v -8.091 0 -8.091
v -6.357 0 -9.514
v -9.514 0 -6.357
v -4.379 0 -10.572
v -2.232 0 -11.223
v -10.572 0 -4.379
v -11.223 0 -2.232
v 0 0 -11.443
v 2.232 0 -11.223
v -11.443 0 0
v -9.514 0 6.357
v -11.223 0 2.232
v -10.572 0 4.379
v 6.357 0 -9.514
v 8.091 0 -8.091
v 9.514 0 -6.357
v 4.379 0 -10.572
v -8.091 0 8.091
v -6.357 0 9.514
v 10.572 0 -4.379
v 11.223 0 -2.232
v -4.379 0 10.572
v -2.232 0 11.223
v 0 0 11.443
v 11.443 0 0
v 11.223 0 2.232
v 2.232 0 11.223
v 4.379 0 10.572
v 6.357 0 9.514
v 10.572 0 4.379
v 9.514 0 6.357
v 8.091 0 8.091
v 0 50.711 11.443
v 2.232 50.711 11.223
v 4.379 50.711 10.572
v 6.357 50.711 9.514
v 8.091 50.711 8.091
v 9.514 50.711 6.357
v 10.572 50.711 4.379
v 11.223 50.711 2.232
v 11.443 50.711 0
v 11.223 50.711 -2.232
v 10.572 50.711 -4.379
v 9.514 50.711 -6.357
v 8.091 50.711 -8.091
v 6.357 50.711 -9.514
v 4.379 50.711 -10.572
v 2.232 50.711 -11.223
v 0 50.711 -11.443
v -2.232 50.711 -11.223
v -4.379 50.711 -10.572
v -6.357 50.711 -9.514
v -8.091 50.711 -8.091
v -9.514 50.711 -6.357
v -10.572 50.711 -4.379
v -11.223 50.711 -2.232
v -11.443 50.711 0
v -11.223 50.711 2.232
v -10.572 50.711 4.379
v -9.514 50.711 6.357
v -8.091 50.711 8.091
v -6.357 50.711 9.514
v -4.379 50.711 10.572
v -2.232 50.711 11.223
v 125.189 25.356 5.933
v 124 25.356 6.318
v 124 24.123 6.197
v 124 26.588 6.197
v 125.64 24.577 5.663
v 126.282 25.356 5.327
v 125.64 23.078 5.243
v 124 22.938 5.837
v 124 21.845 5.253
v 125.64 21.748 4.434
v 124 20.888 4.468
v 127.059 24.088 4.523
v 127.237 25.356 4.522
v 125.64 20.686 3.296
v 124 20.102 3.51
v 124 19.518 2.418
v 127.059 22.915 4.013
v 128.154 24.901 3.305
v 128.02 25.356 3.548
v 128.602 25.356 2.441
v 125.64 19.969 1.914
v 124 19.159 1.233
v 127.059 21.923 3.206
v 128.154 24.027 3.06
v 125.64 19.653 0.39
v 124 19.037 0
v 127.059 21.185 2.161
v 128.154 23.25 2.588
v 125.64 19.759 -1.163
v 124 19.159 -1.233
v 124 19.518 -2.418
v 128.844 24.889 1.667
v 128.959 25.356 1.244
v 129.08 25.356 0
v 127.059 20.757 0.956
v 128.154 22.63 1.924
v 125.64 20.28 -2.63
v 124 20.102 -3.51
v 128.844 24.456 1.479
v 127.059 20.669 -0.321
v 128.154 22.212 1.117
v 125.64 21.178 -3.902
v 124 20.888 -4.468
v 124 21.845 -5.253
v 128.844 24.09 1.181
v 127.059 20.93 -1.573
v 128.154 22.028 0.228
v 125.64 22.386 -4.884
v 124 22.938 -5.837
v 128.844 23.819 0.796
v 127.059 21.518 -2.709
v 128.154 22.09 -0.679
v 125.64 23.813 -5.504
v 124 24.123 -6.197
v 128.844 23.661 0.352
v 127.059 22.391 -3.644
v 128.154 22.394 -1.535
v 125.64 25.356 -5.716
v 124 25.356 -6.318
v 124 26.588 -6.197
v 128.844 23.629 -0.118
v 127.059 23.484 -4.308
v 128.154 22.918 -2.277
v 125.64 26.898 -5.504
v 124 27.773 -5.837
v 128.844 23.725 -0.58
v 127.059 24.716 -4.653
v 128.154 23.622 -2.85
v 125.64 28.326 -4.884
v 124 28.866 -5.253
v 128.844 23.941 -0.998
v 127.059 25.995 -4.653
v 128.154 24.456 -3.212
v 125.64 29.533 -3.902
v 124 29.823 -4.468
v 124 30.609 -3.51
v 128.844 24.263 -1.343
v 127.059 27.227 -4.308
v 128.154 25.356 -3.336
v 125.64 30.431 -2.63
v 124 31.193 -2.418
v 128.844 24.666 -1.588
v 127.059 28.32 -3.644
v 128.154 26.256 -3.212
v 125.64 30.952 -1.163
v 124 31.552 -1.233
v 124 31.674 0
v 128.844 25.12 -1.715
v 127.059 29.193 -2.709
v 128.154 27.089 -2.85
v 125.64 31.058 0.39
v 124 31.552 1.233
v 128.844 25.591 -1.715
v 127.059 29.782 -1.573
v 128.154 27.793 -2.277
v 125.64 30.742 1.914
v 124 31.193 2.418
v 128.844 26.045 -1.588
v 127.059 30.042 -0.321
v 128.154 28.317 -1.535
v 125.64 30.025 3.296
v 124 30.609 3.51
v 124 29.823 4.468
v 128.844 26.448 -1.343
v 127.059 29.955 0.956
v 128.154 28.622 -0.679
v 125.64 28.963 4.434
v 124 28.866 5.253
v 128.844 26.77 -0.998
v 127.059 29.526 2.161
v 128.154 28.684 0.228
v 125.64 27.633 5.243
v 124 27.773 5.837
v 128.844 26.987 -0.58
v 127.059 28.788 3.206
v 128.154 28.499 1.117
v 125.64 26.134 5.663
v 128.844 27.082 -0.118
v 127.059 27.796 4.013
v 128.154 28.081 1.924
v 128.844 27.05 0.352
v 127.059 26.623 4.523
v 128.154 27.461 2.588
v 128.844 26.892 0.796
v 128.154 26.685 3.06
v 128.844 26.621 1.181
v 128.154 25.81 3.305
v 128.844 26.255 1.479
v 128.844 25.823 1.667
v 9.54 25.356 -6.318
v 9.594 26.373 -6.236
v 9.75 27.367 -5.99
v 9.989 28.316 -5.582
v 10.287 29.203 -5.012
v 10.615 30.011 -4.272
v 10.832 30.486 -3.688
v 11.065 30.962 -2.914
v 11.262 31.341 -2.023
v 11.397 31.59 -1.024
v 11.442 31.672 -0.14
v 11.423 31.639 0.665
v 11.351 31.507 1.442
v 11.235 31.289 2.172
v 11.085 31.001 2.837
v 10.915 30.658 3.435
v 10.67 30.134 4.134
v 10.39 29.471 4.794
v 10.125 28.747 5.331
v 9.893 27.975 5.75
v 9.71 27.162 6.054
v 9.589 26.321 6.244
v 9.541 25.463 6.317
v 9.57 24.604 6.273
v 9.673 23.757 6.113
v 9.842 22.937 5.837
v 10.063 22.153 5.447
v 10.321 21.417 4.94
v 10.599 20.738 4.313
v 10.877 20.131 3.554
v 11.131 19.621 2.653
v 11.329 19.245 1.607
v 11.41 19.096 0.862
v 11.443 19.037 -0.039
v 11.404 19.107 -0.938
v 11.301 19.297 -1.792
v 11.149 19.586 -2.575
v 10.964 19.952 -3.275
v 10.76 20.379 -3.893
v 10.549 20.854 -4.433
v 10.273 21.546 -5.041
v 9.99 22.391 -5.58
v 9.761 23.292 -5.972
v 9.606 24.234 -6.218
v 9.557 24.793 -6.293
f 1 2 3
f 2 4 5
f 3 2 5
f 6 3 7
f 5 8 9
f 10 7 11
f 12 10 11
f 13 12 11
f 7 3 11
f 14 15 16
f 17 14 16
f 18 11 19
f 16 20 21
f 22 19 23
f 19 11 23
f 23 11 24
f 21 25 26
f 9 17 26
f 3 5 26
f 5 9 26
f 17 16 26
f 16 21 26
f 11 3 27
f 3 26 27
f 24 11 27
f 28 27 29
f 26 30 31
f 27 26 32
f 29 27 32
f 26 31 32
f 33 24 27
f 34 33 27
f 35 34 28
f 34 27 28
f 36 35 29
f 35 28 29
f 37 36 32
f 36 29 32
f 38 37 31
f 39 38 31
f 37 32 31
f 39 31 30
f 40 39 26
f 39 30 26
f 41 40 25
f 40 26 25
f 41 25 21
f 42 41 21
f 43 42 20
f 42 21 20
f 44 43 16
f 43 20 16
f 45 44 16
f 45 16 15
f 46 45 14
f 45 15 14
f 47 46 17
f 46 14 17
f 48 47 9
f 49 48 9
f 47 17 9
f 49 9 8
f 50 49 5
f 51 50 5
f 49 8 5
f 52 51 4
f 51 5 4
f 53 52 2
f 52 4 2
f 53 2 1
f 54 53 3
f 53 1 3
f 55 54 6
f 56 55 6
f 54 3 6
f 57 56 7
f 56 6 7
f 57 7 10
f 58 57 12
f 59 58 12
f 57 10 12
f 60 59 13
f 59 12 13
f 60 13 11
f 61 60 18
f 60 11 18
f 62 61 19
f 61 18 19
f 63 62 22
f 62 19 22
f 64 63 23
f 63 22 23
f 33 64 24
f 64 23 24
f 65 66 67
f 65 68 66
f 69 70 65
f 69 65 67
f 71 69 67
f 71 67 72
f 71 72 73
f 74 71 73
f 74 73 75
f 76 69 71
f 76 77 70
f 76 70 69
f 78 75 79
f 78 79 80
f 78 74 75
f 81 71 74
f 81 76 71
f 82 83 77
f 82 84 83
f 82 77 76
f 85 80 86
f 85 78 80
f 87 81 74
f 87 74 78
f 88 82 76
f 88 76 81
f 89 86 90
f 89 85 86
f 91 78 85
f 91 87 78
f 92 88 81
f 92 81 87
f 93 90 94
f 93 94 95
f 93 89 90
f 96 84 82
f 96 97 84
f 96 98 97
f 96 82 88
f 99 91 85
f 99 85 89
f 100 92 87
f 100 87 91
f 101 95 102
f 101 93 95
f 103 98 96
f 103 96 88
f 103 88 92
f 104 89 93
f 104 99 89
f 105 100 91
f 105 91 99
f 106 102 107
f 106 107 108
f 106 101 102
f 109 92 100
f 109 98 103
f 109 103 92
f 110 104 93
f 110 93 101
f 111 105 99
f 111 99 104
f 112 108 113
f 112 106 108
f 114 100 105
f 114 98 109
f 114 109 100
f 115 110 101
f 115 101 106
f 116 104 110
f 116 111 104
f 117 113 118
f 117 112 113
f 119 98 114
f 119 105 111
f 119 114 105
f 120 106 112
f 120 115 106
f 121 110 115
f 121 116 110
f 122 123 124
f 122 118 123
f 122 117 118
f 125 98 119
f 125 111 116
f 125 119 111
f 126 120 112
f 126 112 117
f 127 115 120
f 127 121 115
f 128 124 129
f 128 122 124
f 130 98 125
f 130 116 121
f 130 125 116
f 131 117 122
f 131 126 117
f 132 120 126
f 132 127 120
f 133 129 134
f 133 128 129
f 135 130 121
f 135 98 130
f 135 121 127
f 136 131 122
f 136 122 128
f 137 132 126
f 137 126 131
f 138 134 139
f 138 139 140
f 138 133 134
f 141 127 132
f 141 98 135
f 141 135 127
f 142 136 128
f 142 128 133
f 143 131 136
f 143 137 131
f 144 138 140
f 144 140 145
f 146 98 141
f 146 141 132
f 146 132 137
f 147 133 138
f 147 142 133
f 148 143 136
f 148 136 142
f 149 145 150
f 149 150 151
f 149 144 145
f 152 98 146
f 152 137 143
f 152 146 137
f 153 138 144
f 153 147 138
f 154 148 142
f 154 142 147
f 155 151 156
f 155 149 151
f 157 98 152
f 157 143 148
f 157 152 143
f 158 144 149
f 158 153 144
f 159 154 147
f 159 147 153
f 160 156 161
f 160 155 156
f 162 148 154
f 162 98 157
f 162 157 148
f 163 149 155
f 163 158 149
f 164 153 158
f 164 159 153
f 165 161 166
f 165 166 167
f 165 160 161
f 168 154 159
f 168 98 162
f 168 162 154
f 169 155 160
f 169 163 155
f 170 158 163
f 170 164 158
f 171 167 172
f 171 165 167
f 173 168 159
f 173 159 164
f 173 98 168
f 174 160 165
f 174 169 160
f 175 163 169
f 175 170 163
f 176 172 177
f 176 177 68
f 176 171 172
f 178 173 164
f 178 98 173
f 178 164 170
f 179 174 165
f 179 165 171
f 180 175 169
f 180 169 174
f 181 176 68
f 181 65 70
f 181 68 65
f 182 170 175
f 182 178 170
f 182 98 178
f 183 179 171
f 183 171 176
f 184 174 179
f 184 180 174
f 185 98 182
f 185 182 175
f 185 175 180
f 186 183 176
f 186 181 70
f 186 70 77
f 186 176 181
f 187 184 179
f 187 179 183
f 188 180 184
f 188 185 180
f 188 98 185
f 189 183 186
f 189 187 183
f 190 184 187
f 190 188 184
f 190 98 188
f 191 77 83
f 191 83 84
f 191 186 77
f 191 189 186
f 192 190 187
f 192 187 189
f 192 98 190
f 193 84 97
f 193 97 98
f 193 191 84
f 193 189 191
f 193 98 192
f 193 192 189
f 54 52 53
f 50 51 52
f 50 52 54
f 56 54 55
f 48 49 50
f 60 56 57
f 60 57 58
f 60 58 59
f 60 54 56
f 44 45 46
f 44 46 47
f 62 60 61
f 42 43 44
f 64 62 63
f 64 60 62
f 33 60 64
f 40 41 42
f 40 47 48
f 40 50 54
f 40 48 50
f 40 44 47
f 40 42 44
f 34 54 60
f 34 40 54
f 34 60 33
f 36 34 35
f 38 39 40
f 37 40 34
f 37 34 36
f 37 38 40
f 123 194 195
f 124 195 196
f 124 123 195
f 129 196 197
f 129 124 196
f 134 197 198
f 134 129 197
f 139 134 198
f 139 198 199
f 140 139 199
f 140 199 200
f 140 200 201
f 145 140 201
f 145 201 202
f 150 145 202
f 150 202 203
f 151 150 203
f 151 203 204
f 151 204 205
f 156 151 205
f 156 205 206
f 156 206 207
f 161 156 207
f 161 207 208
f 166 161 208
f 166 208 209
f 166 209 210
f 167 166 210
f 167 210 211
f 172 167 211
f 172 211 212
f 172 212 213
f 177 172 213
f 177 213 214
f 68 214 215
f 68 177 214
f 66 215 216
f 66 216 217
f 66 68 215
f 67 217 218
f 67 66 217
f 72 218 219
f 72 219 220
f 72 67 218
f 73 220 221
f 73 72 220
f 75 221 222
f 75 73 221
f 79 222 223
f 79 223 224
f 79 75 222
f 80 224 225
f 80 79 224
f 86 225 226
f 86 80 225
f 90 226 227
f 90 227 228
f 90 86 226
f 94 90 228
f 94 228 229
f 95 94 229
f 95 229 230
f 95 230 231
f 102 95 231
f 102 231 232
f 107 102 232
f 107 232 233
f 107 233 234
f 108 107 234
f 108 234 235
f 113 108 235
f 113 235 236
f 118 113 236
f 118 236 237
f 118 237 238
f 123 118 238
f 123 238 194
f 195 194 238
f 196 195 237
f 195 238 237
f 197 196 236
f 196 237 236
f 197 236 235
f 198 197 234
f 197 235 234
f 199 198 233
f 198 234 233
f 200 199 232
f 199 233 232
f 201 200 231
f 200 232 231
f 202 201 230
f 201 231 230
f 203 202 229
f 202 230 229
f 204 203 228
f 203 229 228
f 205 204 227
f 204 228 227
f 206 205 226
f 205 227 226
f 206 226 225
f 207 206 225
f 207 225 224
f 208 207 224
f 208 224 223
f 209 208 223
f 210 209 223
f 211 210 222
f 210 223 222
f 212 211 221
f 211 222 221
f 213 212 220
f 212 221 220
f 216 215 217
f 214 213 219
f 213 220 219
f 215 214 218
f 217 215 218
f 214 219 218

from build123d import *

# Parameters (mm, degrees)
SKETCH2_R                = 11.4427
BOSS_EXTRUDE1_DEPTH      = 50.7111
BOSS_EXTRUDE2_REACH      = 179.231
BOSS_EXTRUDE2_END_RADIUS = 11.4427
BOSS_EXTRUDE2_START      = 124
SKETCH3_R                = 6.31825
DOME1_FACE_RADIUS        = 6.31825
DOME1_HEIGHT             = 5.08


with BuildPart() as part:
    # Sketch2 → Boss-Extrude1 (new body)
    with BuildSketch(Plane(origin=(0, 0, 0), x_dir=(1, 0, 0), z_dir=(0, 1, 0))):
        with Locations(Location((0, 0, 0), (0, 0, 270))):
            Circle(SKETCH2_R)
    extrude(amount=BOSS_EXTRUDE1_DEPTH)


with BuildPart() as body_2:
    # Boss-Extrude2: up to this cylinder (the profile starts outside it)
    boss_extrude2_end = Plane(origin=(0, 25.35555, 0), z_dir=(0, -1, 0)) * Cylinder(BOSS_EXTRUDE2_END_RADIUS, 382.3474, mode=Mode.PRIVATE)
    # Sketch3 → Boss-Extrude2 (new, up to the surface)
    with BuildSketch(Plane(origin=(0, 0, 0), x_dir=(0, 0, -1), z_dir=(1, 0, 0)).offset(BOSS_EXTRUDE2_START), mode=Mode.PRIVATE) as boss_extrude2_sk1:
        with Locations((0, 25.35555)):
            Circle(SKETCH3_R)
    boss_extrude2_tool1 = extrude(boss_extrude2_sk1.sketch, amount=-BOSS_EXTRUDE2_REACH, mode=Mode.PRIVATE) - boss_extrude2_end
    add(boss_extrude2_tool1.solids().sort_by_distance((124, 25.35555, 0))[0])

    # Dome1: a dome of height H over a round flat face of radius A is a cap of a sphere of radius (A * A + H * H) / (2 * H)
    dome1_r = (DOME1_FACE_RADIUS * DOME1_FACE_RADIUS + DOME1_HEIGHT * DOME1_HEIGHT) / (2 * DOME1_HEIGHT)
    dome1_base = Plane((124, 25.35555, 0), z_dir=(1, 0, 0))
    with Locations(dome1_base.offset(DOME1_HEIGHT - dome1_r)):
        dome1_ball = Sphere(dome1_r, mode=Mode.PRIVATE)
    add(split(dome1_ball, bisect_by=dome1_base, keep=Keep.TOP, mode=Mode.PRIVATE))


solid = Compound([part.part, body_2.part])
